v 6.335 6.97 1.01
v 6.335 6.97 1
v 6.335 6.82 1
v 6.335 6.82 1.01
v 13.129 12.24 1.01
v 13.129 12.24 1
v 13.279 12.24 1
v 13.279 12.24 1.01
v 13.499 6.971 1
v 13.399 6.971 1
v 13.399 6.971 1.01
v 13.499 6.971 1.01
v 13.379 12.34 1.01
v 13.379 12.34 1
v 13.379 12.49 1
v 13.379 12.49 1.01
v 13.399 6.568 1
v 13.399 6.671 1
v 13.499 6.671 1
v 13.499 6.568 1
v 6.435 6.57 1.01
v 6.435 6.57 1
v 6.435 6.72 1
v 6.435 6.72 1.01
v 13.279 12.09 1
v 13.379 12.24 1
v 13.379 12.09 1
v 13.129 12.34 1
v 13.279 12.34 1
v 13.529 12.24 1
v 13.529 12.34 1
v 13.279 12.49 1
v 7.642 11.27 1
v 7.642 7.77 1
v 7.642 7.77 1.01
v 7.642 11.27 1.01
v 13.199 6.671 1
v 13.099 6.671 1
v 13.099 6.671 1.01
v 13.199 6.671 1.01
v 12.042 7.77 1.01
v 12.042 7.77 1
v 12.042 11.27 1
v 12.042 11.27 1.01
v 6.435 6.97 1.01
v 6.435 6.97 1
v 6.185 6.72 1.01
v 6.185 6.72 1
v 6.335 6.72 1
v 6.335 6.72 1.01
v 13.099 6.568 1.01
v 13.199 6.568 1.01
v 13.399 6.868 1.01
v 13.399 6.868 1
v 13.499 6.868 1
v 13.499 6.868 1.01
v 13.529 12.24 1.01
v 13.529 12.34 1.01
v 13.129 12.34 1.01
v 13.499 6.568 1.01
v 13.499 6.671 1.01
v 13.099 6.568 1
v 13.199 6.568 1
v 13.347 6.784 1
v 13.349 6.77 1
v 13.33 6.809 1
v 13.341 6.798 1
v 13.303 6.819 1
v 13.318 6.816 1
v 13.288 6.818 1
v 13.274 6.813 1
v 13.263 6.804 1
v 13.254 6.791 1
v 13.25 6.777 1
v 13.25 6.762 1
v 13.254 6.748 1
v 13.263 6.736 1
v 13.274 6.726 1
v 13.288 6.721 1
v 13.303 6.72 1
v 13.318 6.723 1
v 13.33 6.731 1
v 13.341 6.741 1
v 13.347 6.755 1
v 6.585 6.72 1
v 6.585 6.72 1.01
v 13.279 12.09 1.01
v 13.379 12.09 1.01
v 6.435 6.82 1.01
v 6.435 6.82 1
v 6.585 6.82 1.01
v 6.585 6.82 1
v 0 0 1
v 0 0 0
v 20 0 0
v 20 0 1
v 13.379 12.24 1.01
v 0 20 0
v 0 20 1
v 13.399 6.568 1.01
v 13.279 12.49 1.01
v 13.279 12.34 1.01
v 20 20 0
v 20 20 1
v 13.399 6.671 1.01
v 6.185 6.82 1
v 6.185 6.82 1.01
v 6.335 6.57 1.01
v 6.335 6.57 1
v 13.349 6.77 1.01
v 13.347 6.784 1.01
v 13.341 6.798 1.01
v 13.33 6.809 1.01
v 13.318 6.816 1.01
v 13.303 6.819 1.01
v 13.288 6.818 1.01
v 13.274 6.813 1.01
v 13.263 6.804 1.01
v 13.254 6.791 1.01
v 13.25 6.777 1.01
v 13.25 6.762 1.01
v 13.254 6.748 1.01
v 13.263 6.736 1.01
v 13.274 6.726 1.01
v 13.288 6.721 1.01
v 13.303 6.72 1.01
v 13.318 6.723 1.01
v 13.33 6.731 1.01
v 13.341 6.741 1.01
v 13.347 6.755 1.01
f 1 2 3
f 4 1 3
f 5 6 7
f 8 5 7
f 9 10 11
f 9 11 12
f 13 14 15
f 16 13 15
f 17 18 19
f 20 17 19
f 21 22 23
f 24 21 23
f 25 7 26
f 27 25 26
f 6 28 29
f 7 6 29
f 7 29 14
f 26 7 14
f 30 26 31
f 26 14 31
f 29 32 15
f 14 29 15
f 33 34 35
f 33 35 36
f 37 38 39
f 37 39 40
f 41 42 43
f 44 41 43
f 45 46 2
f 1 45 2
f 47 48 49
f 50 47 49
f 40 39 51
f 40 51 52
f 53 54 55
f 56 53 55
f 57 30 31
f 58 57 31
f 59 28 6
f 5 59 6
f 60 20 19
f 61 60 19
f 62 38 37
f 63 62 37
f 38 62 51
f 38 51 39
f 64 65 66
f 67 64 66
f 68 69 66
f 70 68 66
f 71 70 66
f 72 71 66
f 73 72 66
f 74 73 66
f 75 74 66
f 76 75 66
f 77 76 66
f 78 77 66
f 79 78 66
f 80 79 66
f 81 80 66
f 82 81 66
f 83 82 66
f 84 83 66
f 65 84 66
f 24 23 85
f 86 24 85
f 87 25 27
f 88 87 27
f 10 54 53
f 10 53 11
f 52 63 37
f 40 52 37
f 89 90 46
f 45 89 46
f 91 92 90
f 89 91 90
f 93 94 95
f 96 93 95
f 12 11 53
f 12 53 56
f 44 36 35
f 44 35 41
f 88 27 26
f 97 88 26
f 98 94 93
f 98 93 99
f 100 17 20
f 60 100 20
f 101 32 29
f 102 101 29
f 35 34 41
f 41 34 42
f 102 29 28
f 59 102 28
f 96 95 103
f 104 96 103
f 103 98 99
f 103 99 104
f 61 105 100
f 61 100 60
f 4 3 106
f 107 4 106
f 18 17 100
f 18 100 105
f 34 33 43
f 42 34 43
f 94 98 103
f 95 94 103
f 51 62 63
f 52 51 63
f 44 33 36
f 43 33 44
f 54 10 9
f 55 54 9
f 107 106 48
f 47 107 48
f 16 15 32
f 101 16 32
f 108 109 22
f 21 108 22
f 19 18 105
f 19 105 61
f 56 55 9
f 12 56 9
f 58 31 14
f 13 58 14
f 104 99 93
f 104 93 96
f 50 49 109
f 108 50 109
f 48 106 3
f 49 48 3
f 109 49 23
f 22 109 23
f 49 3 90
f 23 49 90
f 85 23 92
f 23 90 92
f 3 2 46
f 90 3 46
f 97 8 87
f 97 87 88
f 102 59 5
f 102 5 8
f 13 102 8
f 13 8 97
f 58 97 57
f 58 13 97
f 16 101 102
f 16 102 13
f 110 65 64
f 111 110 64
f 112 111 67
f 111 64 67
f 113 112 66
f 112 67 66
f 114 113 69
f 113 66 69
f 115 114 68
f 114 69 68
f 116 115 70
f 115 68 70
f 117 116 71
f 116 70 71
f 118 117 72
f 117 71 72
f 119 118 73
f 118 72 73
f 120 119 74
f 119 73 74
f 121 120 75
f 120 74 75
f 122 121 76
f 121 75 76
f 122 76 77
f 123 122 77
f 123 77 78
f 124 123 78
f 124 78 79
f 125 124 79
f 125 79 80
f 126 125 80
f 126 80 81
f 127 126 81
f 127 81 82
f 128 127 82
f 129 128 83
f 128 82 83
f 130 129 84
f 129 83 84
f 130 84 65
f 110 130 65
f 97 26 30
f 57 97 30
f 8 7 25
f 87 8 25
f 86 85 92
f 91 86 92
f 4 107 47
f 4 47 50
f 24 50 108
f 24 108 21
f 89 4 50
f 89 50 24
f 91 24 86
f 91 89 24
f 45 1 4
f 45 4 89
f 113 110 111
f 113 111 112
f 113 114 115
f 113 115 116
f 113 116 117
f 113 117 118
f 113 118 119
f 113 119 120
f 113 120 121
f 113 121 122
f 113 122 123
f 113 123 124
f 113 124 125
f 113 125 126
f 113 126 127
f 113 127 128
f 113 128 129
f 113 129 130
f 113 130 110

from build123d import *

# Parameters (mm, degrees)
SKETCH1_W             = 20
SKETCH1_H             = 20
BOSS_EXTRUDE1_DEPTH   = 1
SKETCH2_R             = 0.05
BOSS_EXTRUDE2_DEPTH   = 0.01
BOSS_EXTRUDE2_2_DEPTH = 0.01
SKETCH2_W             = 0.1
SKETCH2_H             = 0.102678481
BOSS_EXTRUDE2_3_DEPTH = 0.01
BOSS_EXTRUDE2_4_DEPTH = 0.01
BOSS_EXTRUDE2_5_DEPTH = 0.01
BOSS_EXTRUDE2_6_DEPTH = 0.01
SKETCH3_W             = 4.4
SKETCH3_H             = 3.5
BOSS_EXTRUDE3_DEPTH   = 0.01


with BuildPart() as part:
    # Sketch1 → Boss-Extrude1 (new body)
    with BuildSketch(Plane.XY):
        with Locations((10, 10)):
            Rectangle(SKETCH1_W, SKETCH1_H)
    extrude(amount=BOSS_EXTRUDE1_DEPTH)


with BuildPart() as body_2:
    # Sketch2 → Boss-Extrude2 (new body)
    with BuildSketch(Plane.XY.offset(1)):
        with Locations((13.299260569, 6.769637469)):
            Circle(SKETCH2_R)
    extrude(amount=BOSS_EXTRUDE2_DEPTH)


with BuildPart() as body_3:
    # Sketch2 → Boss-Extrude2 2 (new body)
    with BuildSketch(Plane.XY.offset(1)):
        Polygon((6.334974855, 6.969637469), (6.334974855, 6.819637469), (6.184974855, 6.819637469), (6.184974855, 6.719637469), (6.334974855, 6.719637469), (6.334974855, 6.569637469), (6.434974855, 6.569637469), (6.434974855, 6.719637469), (6.584974855, 6.719637469), (6.584974855, 6.819637469), (6.434974855, 6.819637469), (6.434974855, 6.969637469), align=None)
    extrude(amount=BOSS_EXTRUDE2_2_DEPTH)


with BuildPart() as body_4:
    # Sketch2 → Boss-Extrude2 3 (new body)
    with BuildSketch(Plane.XY.offset(1)):
        with Locations((13.449260569, 6.919637469)):
            Rectangle(SKETCH2_W, SKETCH2_H)
    extrude(amount=BOSS_EXTRUDE2_3_DEPTH)


with BuildPart() as body_5:
    # Sketch2 → Boss-Extrude2 4 (new body)
    with BuildSketch(Plane.XY.offset(1)):
        with Locations((13.449260569, 6.619637469)):
            Rectangle(SKETCH2_W, SKETCH2_H)
    extrude(amount=BOSS_EXTRUDE2_4_DEPTH)


with BuildPart() as body_6:
    # Sketch2 → Boss-Extrude2 5 (new body)
    with BuildSketch(Plane.XY.offset(1)):
        with Locations((13.149260569, 6.619637469)):
            Rectangle(SKETCH2_W, SKETCH2_H)
    extrude(amount=BOSS_EXTRUDE2_5_DEPTH)


with BuildPart() as body_7:
    # Sketch2 → Boss-Extrude2 6 (new body)
    with BuildSketch(Plane.XY.offset(1)):
        Polygon((13.278816913, 12.489566126), (13.278816913, 12.339566126), (13.128816913, 12.339566126), (13.128816913, 12.239566126), (13.278816913, 12.239566126), (13.278816913, 12.089566126), (13.378816913, 12.089566126), (13.378816913, 12.239566126), (13.528816913, 12.239566126), (13.528816913, 12.339566126), (13.378816913, 12.339566126), (13.378816913, 12.489566126), align=None)
    extrude(amount=BOSS_EXTRUDE2_6_DEPTH)


with BuildPart() as body_8:
    # Sketch3 → Boss-Extrude3 (new body)
    with BuildSketch(Plane.XY.offset(1)):
        with Locations((9.842117712, 9.519637469)):
            Rectangle(SKETCH3_W, SKETCH3_H)
    extrude(amount=BOSS_EXTRUDE3_DEPTH)


solid = Compound([part.part, body_2.part, body_3.part, body_4.part, body_5.part, body_6.part, body_7.part, body_8.part])
